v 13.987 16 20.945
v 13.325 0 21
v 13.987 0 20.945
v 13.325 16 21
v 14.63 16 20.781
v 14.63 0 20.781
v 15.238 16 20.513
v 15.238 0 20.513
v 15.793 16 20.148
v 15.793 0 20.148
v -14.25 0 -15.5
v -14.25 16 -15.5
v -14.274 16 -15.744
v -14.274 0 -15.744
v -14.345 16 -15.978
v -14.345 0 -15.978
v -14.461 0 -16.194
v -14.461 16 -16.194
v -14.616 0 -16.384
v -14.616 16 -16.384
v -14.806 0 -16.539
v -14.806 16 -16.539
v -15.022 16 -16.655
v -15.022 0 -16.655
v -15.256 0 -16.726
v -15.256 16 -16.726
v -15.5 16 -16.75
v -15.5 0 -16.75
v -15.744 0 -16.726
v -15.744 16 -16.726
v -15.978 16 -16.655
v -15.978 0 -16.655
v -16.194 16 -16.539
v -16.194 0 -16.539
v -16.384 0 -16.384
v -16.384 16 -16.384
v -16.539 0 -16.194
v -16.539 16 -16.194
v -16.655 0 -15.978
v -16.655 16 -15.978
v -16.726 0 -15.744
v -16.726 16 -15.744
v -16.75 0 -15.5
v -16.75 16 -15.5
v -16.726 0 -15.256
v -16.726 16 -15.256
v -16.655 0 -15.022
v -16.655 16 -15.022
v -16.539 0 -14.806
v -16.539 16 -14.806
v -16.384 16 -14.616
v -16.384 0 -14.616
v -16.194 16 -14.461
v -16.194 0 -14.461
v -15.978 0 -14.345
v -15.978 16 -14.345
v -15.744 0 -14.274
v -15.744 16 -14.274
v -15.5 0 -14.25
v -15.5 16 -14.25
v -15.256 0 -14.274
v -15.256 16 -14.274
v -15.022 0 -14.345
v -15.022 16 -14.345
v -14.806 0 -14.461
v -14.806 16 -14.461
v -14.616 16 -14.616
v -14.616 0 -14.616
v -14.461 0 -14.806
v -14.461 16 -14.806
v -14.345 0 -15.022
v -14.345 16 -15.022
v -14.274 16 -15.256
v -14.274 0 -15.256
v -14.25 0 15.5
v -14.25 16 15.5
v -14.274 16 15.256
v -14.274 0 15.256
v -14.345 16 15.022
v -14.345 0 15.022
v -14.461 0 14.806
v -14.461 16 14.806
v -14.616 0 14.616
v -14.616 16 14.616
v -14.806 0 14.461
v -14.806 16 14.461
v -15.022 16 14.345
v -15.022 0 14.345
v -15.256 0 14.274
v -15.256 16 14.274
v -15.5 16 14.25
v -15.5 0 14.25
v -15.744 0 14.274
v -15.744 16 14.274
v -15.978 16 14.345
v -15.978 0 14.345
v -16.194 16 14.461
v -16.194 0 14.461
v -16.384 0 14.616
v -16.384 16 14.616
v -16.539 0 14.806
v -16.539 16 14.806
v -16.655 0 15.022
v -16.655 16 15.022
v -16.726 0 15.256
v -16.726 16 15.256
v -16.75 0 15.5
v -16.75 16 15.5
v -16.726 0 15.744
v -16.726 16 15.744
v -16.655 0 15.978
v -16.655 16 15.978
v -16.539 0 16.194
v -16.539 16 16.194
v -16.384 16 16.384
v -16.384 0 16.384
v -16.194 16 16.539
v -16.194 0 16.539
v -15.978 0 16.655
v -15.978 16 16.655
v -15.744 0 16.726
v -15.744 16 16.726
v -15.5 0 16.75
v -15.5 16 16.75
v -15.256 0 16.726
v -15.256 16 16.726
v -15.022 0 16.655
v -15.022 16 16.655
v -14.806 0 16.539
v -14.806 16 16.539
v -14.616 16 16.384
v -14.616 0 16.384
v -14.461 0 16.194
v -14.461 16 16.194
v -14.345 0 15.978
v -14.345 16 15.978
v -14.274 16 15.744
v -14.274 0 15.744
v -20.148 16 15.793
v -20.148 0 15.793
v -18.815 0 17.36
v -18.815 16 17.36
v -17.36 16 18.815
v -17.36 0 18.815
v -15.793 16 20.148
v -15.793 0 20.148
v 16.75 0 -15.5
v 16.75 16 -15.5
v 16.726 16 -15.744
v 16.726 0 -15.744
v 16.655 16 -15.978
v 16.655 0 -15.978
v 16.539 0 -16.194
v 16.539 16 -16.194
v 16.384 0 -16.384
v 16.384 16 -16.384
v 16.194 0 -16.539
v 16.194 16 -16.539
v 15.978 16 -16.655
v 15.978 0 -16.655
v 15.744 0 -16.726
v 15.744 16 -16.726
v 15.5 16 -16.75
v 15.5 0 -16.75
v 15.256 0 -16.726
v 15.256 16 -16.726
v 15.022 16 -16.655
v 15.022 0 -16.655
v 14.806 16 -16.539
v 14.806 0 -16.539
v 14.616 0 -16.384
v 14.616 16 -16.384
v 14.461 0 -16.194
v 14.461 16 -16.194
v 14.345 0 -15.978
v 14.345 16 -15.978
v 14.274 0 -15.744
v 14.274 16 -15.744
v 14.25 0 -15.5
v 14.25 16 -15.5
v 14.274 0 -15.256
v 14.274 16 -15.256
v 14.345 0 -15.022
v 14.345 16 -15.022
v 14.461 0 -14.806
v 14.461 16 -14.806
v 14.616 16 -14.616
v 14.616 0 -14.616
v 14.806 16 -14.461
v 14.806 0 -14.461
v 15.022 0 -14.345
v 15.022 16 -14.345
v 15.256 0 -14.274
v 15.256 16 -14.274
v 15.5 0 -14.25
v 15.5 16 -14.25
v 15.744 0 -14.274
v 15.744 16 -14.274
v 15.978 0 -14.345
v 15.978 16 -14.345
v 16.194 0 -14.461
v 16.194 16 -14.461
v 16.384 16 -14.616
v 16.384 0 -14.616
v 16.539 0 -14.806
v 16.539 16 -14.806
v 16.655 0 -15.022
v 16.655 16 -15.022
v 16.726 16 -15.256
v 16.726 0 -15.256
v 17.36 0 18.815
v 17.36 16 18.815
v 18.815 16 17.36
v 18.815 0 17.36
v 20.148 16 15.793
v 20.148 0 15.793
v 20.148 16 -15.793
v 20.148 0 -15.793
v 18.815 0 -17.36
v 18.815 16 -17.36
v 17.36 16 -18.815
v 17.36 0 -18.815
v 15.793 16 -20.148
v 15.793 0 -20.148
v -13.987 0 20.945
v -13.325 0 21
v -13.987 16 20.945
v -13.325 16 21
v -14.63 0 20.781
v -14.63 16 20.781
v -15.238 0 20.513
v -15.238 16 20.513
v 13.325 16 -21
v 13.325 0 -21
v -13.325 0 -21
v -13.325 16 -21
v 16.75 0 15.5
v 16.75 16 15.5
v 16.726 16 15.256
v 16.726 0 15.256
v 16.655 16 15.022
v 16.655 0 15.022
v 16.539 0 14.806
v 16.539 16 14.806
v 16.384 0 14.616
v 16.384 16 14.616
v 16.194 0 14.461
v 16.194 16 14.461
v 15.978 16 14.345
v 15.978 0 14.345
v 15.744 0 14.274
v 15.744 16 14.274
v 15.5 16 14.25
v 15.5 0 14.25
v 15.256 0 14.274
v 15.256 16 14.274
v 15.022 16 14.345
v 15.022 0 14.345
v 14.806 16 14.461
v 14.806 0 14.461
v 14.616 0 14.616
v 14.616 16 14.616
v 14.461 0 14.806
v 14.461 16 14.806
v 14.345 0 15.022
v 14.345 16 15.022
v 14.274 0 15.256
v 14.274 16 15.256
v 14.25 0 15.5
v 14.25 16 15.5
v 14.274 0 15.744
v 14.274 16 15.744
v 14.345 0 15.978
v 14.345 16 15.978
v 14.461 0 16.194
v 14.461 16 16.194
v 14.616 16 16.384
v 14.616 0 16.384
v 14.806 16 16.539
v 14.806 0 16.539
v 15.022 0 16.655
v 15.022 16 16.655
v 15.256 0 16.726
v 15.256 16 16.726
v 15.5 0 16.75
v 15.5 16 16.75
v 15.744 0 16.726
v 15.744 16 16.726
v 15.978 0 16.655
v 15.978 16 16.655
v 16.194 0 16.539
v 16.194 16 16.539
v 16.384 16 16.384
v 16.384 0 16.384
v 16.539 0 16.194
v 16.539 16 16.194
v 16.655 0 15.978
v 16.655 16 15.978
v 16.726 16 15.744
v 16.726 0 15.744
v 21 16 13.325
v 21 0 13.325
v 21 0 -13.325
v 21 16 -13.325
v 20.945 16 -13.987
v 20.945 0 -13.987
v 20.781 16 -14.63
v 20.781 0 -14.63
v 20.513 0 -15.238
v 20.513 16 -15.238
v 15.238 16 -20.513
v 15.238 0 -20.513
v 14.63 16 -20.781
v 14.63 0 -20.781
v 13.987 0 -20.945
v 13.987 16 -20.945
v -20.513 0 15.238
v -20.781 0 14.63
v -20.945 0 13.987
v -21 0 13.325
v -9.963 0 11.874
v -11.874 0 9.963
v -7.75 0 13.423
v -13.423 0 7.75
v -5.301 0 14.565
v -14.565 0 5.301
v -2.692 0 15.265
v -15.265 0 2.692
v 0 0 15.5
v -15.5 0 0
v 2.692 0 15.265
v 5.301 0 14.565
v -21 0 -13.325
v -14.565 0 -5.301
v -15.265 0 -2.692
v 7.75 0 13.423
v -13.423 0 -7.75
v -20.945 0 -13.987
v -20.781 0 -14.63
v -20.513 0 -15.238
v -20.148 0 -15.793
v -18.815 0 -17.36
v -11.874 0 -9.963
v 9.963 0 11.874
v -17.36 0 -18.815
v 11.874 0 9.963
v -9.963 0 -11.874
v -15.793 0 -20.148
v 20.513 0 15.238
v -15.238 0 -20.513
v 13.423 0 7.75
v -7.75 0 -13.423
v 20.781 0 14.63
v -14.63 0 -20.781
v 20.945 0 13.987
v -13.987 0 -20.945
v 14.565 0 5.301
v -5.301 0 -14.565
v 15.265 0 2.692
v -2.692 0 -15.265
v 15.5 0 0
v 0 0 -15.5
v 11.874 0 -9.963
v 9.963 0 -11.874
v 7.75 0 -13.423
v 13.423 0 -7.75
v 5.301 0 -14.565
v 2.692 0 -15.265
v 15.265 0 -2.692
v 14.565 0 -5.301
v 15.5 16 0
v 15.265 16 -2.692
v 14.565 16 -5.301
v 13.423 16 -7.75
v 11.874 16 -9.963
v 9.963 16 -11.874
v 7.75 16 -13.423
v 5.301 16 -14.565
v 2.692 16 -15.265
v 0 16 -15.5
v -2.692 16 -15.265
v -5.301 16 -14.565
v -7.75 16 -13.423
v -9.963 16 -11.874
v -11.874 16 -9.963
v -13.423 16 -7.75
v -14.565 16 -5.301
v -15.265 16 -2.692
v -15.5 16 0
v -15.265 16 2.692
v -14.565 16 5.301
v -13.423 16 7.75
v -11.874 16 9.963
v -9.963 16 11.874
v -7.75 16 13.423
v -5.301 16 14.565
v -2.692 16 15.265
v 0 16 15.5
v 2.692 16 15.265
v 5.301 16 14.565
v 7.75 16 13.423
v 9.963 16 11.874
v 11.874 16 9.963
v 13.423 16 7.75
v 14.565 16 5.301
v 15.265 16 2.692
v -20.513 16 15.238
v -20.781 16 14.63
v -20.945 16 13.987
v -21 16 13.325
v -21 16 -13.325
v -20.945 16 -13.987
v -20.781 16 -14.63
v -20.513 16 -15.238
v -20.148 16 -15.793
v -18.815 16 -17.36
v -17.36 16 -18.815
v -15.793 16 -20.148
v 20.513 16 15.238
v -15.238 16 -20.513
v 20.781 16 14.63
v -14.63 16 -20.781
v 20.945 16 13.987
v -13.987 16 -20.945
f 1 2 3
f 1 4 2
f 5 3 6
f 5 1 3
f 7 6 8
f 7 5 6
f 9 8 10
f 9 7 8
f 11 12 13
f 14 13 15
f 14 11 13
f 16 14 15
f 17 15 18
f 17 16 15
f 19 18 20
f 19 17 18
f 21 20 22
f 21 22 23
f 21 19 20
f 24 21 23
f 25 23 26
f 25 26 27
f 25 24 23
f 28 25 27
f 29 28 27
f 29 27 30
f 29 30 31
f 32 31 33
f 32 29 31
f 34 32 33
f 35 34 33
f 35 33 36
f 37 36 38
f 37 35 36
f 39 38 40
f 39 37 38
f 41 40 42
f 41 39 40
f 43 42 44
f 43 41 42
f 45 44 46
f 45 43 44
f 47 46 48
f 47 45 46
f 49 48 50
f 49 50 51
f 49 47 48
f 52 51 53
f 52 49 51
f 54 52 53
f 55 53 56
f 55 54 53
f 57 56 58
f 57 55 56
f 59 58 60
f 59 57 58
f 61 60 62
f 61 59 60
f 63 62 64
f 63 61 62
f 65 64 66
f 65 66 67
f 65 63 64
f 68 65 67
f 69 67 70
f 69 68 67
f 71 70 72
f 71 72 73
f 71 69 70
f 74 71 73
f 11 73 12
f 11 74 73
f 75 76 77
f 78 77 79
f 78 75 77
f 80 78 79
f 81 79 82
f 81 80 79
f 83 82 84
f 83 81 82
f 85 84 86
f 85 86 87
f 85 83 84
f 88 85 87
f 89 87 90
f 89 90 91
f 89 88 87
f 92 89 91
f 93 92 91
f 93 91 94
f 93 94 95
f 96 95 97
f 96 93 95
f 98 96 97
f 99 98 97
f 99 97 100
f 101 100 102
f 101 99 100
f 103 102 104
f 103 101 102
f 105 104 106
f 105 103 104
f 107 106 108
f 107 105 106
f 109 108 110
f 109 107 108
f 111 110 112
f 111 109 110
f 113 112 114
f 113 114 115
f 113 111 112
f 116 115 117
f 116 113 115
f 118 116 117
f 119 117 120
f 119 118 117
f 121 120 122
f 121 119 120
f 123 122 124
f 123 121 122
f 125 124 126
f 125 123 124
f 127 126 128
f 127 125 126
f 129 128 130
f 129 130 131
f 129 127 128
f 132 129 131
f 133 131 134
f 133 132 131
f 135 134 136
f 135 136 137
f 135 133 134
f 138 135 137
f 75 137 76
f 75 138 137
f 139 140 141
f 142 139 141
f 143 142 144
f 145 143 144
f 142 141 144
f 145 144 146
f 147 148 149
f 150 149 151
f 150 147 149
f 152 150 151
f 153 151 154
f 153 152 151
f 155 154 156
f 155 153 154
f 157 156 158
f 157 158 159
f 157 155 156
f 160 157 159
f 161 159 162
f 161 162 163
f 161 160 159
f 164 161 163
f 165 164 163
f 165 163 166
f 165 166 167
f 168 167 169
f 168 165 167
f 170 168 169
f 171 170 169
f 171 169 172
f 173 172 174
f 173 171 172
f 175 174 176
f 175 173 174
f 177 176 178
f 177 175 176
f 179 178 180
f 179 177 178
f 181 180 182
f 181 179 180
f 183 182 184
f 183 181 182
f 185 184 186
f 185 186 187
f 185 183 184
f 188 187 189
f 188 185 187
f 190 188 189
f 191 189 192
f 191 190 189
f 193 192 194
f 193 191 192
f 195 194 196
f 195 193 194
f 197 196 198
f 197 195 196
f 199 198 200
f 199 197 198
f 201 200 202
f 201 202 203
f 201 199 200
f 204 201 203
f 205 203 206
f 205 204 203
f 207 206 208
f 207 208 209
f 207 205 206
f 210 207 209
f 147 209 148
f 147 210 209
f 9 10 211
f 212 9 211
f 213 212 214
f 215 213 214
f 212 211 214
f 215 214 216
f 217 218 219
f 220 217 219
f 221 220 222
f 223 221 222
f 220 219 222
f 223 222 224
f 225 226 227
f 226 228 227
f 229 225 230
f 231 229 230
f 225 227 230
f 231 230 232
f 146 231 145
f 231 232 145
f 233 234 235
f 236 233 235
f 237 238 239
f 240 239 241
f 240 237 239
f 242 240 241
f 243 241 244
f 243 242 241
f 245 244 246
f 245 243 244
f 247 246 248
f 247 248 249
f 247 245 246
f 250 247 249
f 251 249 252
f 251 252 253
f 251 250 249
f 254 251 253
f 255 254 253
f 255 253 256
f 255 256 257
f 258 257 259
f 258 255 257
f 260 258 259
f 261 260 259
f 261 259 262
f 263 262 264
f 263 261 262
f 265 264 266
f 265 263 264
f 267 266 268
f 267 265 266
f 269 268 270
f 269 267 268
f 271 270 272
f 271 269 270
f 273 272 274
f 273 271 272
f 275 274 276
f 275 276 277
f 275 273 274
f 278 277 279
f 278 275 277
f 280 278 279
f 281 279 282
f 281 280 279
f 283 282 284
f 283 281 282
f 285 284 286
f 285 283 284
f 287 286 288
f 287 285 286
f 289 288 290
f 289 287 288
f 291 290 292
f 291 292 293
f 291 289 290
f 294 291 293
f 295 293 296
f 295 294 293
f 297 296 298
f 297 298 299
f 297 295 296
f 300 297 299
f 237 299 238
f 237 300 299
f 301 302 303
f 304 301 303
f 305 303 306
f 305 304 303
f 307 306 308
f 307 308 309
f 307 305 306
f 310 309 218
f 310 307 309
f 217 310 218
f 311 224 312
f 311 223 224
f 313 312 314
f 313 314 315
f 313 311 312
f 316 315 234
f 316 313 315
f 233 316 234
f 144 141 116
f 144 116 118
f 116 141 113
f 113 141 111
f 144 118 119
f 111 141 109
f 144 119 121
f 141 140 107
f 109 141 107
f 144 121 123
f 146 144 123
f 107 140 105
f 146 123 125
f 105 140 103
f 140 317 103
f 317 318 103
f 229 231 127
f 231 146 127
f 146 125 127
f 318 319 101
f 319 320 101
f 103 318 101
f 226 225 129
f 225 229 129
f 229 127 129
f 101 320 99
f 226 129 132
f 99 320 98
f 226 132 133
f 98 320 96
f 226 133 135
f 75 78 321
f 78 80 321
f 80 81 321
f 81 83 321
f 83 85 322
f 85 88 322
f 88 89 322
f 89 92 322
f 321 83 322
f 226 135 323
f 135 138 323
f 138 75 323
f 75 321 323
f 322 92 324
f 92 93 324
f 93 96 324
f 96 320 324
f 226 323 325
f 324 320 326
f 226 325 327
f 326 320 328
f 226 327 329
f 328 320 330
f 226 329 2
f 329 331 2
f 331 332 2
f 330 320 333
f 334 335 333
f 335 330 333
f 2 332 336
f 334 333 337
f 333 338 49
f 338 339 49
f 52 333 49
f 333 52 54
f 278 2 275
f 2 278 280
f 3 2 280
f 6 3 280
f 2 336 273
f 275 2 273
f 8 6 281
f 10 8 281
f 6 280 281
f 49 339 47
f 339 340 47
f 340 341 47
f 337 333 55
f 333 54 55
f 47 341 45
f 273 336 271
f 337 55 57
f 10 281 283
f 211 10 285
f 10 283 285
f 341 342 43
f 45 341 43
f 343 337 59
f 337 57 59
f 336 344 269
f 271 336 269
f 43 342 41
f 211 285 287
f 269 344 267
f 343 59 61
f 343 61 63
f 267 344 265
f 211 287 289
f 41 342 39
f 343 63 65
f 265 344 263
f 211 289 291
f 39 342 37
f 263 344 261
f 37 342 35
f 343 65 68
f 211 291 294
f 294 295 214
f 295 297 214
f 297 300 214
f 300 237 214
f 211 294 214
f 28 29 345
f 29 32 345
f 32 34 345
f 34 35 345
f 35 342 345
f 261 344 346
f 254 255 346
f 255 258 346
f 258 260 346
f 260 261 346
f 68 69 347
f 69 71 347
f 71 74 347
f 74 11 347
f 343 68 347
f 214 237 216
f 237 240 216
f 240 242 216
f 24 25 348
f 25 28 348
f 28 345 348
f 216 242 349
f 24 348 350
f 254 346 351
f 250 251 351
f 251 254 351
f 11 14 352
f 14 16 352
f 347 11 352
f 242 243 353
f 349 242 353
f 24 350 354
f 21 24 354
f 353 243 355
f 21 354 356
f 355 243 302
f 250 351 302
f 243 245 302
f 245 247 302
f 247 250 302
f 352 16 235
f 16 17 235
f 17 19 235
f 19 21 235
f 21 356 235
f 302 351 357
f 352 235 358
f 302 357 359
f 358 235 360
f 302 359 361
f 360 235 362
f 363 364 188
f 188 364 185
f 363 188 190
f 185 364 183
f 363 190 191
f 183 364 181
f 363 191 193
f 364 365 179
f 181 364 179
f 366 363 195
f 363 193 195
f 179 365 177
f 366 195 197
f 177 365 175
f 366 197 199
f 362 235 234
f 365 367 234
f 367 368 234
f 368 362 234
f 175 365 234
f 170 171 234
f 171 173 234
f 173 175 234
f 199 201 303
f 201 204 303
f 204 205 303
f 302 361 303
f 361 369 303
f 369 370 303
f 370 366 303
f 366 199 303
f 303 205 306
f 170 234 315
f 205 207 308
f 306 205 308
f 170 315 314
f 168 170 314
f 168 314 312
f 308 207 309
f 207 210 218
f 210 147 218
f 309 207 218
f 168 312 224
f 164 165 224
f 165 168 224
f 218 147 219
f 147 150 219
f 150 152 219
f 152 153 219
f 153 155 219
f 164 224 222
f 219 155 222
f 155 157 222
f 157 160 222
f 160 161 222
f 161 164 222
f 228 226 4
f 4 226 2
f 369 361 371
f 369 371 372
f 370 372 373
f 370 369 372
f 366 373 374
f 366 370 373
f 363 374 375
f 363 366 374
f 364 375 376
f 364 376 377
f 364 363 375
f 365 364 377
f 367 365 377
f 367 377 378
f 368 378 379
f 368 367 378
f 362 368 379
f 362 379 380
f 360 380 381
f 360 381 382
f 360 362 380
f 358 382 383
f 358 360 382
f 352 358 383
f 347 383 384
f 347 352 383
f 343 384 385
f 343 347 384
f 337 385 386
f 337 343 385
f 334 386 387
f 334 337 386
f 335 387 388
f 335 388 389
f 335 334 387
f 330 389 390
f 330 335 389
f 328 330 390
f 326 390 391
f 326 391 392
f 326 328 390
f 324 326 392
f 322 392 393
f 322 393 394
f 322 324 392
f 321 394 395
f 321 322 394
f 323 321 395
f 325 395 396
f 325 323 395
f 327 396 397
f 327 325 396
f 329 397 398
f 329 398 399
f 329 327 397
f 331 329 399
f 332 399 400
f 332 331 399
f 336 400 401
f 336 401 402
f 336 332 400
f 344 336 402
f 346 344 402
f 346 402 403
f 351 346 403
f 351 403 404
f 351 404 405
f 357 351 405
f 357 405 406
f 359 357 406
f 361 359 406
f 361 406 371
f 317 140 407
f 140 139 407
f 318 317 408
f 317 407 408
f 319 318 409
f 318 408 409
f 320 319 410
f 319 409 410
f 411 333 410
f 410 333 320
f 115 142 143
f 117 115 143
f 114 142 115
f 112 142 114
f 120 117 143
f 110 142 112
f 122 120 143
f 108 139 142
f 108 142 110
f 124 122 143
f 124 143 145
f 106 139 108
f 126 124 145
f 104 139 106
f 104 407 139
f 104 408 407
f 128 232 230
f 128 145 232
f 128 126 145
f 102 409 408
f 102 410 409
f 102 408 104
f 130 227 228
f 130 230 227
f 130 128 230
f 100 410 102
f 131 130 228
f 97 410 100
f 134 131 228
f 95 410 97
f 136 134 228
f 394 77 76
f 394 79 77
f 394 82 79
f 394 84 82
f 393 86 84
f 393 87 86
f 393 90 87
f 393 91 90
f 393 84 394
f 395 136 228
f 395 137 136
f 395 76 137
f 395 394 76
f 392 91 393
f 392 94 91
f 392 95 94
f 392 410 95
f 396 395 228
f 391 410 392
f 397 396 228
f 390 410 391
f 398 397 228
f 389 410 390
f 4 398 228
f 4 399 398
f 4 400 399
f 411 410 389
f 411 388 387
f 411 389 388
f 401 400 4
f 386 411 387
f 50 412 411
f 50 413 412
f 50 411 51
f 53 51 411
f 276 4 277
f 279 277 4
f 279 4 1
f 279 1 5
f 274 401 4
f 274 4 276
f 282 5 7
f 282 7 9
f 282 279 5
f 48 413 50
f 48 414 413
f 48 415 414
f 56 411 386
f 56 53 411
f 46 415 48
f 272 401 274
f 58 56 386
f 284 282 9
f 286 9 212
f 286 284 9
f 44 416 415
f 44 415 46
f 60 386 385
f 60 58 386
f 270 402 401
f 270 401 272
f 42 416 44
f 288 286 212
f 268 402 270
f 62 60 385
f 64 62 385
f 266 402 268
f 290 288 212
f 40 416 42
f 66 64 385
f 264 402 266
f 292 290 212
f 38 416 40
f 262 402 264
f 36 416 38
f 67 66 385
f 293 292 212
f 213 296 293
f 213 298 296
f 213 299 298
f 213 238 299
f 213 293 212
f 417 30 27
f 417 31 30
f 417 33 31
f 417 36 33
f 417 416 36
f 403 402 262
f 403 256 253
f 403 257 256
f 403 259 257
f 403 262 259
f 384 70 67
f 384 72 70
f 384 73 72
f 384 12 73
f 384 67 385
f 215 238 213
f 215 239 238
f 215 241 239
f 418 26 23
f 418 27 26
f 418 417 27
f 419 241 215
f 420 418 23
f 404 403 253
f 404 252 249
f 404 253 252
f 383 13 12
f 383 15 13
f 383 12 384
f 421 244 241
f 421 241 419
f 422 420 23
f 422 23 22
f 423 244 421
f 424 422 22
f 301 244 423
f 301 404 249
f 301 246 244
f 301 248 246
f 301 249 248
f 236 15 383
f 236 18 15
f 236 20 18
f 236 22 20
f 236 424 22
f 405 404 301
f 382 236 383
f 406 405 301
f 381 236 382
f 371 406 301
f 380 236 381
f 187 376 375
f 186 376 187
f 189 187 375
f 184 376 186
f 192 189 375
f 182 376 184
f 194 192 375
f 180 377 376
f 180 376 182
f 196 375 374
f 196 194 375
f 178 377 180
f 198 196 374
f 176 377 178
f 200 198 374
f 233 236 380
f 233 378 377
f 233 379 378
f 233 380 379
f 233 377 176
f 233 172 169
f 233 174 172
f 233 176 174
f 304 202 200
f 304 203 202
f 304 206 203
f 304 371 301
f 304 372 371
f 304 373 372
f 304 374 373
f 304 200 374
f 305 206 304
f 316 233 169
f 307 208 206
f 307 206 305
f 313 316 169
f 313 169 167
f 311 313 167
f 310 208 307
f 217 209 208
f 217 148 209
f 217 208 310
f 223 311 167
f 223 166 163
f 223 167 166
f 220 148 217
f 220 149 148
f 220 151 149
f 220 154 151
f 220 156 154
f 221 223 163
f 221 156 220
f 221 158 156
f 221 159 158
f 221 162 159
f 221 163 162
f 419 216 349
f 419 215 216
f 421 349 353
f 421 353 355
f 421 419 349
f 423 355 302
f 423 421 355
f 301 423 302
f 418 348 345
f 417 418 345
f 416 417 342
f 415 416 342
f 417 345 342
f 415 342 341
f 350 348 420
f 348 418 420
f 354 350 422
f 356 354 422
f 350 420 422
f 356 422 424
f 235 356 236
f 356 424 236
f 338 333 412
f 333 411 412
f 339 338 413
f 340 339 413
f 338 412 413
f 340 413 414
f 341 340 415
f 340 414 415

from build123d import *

# Parameters (mm, degrees)
SKETCH_1_R      = 1.25
SKETCH_1_R_2    = 15.5
EXTRUDE_1_DEPTH = 16
FILLET_1_R      = 4


with BuildPart() as part:
    # Эскиз1 → Бобышка-Вытянуть1 (new body)
    with BuildSketch(Plane(origin=(0, 0, 0), x_dir=(1, 0, 0), z_dir=(0, 1, 0))):
        with BuildLine():
            Line((-14.641038215, -21), (14.641038215, -21))
            ThreePointArc((14.641038215, -21), (18.101933598, -18.101933598), (21, -14.641038215))
            Line((21, -14.641038215), (21, 14.641038215))
            ThreePointArc((21, 14.641038215), (18.101933598, 18.101933598), (14.641038215, 21))
            Line((14.641038215, 21), (-14.641038215, 21))
            ThreePointArc((-14.641038215, 21), (-18.101933598, 18.101933598), (-21, 14.641038215))
            Line((-21, 14.641038215), (-21, -14.641038215))
            ThreePointArc((-21, -14.641038215), (-18.101933598, -18.101933598), (-14.641038215, -21))
        make_face()
        with Locations((-15.5, 15.5)):
            Circle(SKETCH_1_R, mode=Mode.SUBTRACT)
        with Locations((15.5, 15.5)):
            Circle(SKETCH_1_R, mode=Mode.SUBTRACT)
        with Locations((15.5, -15.5)):
            Circle(SKETCH_1_R, mode=Mode.SUBTRACT)
        with Locations((-15.5, -15.5)):
            Circle(SKETCH_1_R, mode=Mode.SUBTRACT)
        Circle(SKETCH_1_R_2, mode=Mode.SUBTRACT)
    extrude(amount=EXTRUDE_1_DEPTH)

    # Скругление1
    fillet_1_edges = [part.edges().sort_by_distance(p)[0] for p in [
        (21, 8, -14.641038215),
        (21, 8, 14.641038215),
        (14.641038215, 8, 21),
        (-14.641038215, 8, 21),
        (-21, 8, 14.641038215),
        (-21, 8, -14.641038215),
        (-14.641038215, 8, -21),
        (14.641038215, 8, -21),
    ]]
    fillet(fillet_1_edges, radius=FILLET_1_R)


solid = part.part
